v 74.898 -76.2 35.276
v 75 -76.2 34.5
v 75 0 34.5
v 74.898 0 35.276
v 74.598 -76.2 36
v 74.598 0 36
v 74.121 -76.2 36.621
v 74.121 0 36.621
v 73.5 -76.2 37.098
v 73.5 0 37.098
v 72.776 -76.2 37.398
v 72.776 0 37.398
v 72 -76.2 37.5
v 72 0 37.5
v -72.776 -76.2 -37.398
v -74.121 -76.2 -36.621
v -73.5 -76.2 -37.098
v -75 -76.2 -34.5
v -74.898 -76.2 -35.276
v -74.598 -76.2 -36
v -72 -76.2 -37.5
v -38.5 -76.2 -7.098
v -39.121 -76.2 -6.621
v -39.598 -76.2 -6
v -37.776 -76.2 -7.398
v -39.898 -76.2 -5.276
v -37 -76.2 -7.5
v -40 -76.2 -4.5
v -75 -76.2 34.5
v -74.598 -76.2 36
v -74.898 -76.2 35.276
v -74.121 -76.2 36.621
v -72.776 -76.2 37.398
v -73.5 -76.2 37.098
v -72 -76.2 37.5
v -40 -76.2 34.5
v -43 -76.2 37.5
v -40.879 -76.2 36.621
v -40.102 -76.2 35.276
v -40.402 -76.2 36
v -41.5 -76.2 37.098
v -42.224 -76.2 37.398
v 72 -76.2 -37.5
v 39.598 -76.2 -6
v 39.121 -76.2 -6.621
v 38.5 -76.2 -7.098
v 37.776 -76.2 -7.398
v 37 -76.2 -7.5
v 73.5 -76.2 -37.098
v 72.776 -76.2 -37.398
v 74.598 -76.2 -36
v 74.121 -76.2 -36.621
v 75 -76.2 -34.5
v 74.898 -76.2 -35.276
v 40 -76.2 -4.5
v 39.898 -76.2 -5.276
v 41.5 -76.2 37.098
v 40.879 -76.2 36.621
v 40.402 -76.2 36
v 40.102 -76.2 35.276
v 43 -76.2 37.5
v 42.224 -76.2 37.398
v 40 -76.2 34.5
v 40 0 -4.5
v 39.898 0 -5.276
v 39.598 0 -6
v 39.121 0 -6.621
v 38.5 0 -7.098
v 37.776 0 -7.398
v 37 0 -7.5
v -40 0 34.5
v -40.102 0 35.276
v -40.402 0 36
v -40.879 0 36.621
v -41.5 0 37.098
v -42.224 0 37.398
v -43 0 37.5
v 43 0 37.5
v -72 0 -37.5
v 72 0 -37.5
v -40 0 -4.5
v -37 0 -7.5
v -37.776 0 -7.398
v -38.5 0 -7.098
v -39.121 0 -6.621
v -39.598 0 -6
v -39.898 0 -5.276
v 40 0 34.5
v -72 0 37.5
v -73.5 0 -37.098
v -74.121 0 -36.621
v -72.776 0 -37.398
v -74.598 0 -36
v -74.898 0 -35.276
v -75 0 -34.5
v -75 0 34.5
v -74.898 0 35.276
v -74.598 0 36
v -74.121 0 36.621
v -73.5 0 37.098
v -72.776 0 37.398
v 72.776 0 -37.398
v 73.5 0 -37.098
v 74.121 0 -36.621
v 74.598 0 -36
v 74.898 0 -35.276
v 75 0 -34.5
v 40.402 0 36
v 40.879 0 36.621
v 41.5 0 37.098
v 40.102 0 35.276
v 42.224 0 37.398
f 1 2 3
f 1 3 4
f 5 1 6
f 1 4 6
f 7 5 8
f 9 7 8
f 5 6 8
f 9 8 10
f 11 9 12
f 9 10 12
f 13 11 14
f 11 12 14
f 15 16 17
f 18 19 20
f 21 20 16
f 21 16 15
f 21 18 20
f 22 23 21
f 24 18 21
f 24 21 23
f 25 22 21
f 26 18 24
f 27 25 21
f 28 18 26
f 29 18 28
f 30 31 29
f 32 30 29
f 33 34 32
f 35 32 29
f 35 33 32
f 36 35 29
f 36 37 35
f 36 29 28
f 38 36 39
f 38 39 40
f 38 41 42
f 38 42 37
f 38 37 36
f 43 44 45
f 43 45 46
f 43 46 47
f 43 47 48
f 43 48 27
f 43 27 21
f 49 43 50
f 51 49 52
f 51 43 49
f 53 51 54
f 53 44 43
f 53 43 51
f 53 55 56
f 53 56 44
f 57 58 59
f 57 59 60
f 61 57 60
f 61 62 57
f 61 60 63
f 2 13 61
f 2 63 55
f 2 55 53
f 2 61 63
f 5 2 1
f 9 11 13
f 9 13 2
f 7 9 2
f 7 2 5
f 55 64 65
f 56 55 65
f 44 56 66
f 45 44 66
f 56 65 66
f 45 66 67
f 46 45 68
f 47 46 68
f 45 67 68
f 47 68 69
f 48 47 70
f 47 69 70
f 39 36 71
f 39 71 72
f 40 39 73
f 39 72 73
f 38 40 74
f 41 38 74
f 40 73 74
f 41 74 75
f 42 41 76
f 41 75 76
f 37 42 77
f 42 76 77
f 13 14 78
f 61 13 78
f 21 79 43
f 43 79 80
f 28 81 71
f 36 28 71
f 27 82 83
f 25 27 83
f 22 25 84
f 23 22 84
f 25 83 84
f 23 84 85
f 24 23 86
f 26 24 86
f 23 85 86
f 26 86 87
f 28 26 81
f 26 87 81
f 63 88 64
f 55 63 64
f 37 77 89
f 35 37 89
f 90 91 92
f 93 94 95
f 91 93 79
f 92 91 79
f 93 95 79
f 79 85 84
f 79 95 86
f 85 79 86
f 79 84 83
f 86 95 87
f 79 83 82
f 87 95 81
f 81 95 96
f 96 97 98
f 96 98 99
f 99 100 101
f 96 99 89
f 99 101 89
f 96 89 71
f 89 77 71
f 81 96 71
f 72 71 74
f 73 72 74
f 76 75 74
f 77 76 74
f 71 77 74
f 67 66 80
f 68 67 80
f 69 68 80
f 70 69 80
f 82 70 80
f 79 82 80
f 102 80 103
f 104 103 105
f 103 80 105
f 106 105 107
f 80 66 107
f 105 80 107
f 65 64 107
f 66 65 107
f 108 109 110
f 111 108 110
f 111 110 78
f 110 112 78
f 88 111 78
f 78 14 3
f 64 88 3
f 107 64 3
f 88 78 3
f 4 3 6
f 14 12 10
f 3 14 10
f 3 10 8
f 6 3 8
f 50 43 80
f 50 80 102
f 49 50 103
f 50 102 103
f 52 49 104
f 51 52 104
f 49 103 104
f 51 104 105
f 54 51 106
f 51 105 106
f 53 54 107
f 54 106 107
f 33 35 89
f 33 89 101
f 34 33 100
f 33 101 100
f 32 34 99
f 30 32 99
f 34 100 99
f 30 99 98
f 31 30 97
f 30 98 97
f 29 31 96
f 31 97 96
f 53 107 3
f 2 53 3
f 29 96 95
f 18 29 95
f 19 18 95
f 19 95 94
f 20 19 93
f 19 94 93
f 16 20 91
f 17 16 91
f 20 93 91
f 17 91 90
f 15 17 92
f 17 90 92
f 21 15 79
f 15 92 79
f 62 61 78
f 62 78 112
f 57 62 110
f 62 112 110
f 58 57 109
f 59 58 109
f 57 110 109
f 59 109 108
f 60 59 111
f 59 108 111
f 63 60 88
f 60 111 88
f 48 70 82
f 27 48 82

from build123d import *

# Parameters (mm, degrees)
F1_DEPTH = 76.2


with BuildPart() as f1:
    # F0 (on Front) → F1 (new body)
    with BuildSketch(Plane.XZ):
        with BuildLine():
            ThreePointArc((-75, -34.5), (-74.12132, -36.62132), (-72, -37.5))
            Line((-72, -37.5), (72, -37.5))
            ThreePointArc((72, -37.5), (74.12132, -36.62132), (75, -34.5))
            Line((75, -34.5), (75, 34.5))
            ThreePointArc((75, 34.5), (74.12132, 36.62132), (72, 37.5))
            Line((72, 37.5), (43, 37.5))
            ThreePointArc((43, 37.5), (40.87868, 36.62132), (40, 34.5))
            Line((40, 34.5), (40, -4.5))
            ThreePointArc((40, -4.5), (39.12132, -6.62132), (37, -7.5))
            Line((37, -7.5), (-37, -7.5))
            ThreePointArc((-37, -7.5), (-39.12132, -6.62132), (-40, -4.5))
            Line((-40, -4.5), (-40, 34.5))
            ThreePointArc((-40, 34.5), (-40.87868, 36.62132), (-43, 37.5))
            Line((-43, 37.5), (-72, 37.5))
            ThreePointArc((-72, 37.5), (-74.12132, 36.62132), (-75, 34.5))
            Line((-75, 34.5), (-75, -34.5))
        make_face()
    extrude(amount=F1_DEPTH)


solid = f1.part
